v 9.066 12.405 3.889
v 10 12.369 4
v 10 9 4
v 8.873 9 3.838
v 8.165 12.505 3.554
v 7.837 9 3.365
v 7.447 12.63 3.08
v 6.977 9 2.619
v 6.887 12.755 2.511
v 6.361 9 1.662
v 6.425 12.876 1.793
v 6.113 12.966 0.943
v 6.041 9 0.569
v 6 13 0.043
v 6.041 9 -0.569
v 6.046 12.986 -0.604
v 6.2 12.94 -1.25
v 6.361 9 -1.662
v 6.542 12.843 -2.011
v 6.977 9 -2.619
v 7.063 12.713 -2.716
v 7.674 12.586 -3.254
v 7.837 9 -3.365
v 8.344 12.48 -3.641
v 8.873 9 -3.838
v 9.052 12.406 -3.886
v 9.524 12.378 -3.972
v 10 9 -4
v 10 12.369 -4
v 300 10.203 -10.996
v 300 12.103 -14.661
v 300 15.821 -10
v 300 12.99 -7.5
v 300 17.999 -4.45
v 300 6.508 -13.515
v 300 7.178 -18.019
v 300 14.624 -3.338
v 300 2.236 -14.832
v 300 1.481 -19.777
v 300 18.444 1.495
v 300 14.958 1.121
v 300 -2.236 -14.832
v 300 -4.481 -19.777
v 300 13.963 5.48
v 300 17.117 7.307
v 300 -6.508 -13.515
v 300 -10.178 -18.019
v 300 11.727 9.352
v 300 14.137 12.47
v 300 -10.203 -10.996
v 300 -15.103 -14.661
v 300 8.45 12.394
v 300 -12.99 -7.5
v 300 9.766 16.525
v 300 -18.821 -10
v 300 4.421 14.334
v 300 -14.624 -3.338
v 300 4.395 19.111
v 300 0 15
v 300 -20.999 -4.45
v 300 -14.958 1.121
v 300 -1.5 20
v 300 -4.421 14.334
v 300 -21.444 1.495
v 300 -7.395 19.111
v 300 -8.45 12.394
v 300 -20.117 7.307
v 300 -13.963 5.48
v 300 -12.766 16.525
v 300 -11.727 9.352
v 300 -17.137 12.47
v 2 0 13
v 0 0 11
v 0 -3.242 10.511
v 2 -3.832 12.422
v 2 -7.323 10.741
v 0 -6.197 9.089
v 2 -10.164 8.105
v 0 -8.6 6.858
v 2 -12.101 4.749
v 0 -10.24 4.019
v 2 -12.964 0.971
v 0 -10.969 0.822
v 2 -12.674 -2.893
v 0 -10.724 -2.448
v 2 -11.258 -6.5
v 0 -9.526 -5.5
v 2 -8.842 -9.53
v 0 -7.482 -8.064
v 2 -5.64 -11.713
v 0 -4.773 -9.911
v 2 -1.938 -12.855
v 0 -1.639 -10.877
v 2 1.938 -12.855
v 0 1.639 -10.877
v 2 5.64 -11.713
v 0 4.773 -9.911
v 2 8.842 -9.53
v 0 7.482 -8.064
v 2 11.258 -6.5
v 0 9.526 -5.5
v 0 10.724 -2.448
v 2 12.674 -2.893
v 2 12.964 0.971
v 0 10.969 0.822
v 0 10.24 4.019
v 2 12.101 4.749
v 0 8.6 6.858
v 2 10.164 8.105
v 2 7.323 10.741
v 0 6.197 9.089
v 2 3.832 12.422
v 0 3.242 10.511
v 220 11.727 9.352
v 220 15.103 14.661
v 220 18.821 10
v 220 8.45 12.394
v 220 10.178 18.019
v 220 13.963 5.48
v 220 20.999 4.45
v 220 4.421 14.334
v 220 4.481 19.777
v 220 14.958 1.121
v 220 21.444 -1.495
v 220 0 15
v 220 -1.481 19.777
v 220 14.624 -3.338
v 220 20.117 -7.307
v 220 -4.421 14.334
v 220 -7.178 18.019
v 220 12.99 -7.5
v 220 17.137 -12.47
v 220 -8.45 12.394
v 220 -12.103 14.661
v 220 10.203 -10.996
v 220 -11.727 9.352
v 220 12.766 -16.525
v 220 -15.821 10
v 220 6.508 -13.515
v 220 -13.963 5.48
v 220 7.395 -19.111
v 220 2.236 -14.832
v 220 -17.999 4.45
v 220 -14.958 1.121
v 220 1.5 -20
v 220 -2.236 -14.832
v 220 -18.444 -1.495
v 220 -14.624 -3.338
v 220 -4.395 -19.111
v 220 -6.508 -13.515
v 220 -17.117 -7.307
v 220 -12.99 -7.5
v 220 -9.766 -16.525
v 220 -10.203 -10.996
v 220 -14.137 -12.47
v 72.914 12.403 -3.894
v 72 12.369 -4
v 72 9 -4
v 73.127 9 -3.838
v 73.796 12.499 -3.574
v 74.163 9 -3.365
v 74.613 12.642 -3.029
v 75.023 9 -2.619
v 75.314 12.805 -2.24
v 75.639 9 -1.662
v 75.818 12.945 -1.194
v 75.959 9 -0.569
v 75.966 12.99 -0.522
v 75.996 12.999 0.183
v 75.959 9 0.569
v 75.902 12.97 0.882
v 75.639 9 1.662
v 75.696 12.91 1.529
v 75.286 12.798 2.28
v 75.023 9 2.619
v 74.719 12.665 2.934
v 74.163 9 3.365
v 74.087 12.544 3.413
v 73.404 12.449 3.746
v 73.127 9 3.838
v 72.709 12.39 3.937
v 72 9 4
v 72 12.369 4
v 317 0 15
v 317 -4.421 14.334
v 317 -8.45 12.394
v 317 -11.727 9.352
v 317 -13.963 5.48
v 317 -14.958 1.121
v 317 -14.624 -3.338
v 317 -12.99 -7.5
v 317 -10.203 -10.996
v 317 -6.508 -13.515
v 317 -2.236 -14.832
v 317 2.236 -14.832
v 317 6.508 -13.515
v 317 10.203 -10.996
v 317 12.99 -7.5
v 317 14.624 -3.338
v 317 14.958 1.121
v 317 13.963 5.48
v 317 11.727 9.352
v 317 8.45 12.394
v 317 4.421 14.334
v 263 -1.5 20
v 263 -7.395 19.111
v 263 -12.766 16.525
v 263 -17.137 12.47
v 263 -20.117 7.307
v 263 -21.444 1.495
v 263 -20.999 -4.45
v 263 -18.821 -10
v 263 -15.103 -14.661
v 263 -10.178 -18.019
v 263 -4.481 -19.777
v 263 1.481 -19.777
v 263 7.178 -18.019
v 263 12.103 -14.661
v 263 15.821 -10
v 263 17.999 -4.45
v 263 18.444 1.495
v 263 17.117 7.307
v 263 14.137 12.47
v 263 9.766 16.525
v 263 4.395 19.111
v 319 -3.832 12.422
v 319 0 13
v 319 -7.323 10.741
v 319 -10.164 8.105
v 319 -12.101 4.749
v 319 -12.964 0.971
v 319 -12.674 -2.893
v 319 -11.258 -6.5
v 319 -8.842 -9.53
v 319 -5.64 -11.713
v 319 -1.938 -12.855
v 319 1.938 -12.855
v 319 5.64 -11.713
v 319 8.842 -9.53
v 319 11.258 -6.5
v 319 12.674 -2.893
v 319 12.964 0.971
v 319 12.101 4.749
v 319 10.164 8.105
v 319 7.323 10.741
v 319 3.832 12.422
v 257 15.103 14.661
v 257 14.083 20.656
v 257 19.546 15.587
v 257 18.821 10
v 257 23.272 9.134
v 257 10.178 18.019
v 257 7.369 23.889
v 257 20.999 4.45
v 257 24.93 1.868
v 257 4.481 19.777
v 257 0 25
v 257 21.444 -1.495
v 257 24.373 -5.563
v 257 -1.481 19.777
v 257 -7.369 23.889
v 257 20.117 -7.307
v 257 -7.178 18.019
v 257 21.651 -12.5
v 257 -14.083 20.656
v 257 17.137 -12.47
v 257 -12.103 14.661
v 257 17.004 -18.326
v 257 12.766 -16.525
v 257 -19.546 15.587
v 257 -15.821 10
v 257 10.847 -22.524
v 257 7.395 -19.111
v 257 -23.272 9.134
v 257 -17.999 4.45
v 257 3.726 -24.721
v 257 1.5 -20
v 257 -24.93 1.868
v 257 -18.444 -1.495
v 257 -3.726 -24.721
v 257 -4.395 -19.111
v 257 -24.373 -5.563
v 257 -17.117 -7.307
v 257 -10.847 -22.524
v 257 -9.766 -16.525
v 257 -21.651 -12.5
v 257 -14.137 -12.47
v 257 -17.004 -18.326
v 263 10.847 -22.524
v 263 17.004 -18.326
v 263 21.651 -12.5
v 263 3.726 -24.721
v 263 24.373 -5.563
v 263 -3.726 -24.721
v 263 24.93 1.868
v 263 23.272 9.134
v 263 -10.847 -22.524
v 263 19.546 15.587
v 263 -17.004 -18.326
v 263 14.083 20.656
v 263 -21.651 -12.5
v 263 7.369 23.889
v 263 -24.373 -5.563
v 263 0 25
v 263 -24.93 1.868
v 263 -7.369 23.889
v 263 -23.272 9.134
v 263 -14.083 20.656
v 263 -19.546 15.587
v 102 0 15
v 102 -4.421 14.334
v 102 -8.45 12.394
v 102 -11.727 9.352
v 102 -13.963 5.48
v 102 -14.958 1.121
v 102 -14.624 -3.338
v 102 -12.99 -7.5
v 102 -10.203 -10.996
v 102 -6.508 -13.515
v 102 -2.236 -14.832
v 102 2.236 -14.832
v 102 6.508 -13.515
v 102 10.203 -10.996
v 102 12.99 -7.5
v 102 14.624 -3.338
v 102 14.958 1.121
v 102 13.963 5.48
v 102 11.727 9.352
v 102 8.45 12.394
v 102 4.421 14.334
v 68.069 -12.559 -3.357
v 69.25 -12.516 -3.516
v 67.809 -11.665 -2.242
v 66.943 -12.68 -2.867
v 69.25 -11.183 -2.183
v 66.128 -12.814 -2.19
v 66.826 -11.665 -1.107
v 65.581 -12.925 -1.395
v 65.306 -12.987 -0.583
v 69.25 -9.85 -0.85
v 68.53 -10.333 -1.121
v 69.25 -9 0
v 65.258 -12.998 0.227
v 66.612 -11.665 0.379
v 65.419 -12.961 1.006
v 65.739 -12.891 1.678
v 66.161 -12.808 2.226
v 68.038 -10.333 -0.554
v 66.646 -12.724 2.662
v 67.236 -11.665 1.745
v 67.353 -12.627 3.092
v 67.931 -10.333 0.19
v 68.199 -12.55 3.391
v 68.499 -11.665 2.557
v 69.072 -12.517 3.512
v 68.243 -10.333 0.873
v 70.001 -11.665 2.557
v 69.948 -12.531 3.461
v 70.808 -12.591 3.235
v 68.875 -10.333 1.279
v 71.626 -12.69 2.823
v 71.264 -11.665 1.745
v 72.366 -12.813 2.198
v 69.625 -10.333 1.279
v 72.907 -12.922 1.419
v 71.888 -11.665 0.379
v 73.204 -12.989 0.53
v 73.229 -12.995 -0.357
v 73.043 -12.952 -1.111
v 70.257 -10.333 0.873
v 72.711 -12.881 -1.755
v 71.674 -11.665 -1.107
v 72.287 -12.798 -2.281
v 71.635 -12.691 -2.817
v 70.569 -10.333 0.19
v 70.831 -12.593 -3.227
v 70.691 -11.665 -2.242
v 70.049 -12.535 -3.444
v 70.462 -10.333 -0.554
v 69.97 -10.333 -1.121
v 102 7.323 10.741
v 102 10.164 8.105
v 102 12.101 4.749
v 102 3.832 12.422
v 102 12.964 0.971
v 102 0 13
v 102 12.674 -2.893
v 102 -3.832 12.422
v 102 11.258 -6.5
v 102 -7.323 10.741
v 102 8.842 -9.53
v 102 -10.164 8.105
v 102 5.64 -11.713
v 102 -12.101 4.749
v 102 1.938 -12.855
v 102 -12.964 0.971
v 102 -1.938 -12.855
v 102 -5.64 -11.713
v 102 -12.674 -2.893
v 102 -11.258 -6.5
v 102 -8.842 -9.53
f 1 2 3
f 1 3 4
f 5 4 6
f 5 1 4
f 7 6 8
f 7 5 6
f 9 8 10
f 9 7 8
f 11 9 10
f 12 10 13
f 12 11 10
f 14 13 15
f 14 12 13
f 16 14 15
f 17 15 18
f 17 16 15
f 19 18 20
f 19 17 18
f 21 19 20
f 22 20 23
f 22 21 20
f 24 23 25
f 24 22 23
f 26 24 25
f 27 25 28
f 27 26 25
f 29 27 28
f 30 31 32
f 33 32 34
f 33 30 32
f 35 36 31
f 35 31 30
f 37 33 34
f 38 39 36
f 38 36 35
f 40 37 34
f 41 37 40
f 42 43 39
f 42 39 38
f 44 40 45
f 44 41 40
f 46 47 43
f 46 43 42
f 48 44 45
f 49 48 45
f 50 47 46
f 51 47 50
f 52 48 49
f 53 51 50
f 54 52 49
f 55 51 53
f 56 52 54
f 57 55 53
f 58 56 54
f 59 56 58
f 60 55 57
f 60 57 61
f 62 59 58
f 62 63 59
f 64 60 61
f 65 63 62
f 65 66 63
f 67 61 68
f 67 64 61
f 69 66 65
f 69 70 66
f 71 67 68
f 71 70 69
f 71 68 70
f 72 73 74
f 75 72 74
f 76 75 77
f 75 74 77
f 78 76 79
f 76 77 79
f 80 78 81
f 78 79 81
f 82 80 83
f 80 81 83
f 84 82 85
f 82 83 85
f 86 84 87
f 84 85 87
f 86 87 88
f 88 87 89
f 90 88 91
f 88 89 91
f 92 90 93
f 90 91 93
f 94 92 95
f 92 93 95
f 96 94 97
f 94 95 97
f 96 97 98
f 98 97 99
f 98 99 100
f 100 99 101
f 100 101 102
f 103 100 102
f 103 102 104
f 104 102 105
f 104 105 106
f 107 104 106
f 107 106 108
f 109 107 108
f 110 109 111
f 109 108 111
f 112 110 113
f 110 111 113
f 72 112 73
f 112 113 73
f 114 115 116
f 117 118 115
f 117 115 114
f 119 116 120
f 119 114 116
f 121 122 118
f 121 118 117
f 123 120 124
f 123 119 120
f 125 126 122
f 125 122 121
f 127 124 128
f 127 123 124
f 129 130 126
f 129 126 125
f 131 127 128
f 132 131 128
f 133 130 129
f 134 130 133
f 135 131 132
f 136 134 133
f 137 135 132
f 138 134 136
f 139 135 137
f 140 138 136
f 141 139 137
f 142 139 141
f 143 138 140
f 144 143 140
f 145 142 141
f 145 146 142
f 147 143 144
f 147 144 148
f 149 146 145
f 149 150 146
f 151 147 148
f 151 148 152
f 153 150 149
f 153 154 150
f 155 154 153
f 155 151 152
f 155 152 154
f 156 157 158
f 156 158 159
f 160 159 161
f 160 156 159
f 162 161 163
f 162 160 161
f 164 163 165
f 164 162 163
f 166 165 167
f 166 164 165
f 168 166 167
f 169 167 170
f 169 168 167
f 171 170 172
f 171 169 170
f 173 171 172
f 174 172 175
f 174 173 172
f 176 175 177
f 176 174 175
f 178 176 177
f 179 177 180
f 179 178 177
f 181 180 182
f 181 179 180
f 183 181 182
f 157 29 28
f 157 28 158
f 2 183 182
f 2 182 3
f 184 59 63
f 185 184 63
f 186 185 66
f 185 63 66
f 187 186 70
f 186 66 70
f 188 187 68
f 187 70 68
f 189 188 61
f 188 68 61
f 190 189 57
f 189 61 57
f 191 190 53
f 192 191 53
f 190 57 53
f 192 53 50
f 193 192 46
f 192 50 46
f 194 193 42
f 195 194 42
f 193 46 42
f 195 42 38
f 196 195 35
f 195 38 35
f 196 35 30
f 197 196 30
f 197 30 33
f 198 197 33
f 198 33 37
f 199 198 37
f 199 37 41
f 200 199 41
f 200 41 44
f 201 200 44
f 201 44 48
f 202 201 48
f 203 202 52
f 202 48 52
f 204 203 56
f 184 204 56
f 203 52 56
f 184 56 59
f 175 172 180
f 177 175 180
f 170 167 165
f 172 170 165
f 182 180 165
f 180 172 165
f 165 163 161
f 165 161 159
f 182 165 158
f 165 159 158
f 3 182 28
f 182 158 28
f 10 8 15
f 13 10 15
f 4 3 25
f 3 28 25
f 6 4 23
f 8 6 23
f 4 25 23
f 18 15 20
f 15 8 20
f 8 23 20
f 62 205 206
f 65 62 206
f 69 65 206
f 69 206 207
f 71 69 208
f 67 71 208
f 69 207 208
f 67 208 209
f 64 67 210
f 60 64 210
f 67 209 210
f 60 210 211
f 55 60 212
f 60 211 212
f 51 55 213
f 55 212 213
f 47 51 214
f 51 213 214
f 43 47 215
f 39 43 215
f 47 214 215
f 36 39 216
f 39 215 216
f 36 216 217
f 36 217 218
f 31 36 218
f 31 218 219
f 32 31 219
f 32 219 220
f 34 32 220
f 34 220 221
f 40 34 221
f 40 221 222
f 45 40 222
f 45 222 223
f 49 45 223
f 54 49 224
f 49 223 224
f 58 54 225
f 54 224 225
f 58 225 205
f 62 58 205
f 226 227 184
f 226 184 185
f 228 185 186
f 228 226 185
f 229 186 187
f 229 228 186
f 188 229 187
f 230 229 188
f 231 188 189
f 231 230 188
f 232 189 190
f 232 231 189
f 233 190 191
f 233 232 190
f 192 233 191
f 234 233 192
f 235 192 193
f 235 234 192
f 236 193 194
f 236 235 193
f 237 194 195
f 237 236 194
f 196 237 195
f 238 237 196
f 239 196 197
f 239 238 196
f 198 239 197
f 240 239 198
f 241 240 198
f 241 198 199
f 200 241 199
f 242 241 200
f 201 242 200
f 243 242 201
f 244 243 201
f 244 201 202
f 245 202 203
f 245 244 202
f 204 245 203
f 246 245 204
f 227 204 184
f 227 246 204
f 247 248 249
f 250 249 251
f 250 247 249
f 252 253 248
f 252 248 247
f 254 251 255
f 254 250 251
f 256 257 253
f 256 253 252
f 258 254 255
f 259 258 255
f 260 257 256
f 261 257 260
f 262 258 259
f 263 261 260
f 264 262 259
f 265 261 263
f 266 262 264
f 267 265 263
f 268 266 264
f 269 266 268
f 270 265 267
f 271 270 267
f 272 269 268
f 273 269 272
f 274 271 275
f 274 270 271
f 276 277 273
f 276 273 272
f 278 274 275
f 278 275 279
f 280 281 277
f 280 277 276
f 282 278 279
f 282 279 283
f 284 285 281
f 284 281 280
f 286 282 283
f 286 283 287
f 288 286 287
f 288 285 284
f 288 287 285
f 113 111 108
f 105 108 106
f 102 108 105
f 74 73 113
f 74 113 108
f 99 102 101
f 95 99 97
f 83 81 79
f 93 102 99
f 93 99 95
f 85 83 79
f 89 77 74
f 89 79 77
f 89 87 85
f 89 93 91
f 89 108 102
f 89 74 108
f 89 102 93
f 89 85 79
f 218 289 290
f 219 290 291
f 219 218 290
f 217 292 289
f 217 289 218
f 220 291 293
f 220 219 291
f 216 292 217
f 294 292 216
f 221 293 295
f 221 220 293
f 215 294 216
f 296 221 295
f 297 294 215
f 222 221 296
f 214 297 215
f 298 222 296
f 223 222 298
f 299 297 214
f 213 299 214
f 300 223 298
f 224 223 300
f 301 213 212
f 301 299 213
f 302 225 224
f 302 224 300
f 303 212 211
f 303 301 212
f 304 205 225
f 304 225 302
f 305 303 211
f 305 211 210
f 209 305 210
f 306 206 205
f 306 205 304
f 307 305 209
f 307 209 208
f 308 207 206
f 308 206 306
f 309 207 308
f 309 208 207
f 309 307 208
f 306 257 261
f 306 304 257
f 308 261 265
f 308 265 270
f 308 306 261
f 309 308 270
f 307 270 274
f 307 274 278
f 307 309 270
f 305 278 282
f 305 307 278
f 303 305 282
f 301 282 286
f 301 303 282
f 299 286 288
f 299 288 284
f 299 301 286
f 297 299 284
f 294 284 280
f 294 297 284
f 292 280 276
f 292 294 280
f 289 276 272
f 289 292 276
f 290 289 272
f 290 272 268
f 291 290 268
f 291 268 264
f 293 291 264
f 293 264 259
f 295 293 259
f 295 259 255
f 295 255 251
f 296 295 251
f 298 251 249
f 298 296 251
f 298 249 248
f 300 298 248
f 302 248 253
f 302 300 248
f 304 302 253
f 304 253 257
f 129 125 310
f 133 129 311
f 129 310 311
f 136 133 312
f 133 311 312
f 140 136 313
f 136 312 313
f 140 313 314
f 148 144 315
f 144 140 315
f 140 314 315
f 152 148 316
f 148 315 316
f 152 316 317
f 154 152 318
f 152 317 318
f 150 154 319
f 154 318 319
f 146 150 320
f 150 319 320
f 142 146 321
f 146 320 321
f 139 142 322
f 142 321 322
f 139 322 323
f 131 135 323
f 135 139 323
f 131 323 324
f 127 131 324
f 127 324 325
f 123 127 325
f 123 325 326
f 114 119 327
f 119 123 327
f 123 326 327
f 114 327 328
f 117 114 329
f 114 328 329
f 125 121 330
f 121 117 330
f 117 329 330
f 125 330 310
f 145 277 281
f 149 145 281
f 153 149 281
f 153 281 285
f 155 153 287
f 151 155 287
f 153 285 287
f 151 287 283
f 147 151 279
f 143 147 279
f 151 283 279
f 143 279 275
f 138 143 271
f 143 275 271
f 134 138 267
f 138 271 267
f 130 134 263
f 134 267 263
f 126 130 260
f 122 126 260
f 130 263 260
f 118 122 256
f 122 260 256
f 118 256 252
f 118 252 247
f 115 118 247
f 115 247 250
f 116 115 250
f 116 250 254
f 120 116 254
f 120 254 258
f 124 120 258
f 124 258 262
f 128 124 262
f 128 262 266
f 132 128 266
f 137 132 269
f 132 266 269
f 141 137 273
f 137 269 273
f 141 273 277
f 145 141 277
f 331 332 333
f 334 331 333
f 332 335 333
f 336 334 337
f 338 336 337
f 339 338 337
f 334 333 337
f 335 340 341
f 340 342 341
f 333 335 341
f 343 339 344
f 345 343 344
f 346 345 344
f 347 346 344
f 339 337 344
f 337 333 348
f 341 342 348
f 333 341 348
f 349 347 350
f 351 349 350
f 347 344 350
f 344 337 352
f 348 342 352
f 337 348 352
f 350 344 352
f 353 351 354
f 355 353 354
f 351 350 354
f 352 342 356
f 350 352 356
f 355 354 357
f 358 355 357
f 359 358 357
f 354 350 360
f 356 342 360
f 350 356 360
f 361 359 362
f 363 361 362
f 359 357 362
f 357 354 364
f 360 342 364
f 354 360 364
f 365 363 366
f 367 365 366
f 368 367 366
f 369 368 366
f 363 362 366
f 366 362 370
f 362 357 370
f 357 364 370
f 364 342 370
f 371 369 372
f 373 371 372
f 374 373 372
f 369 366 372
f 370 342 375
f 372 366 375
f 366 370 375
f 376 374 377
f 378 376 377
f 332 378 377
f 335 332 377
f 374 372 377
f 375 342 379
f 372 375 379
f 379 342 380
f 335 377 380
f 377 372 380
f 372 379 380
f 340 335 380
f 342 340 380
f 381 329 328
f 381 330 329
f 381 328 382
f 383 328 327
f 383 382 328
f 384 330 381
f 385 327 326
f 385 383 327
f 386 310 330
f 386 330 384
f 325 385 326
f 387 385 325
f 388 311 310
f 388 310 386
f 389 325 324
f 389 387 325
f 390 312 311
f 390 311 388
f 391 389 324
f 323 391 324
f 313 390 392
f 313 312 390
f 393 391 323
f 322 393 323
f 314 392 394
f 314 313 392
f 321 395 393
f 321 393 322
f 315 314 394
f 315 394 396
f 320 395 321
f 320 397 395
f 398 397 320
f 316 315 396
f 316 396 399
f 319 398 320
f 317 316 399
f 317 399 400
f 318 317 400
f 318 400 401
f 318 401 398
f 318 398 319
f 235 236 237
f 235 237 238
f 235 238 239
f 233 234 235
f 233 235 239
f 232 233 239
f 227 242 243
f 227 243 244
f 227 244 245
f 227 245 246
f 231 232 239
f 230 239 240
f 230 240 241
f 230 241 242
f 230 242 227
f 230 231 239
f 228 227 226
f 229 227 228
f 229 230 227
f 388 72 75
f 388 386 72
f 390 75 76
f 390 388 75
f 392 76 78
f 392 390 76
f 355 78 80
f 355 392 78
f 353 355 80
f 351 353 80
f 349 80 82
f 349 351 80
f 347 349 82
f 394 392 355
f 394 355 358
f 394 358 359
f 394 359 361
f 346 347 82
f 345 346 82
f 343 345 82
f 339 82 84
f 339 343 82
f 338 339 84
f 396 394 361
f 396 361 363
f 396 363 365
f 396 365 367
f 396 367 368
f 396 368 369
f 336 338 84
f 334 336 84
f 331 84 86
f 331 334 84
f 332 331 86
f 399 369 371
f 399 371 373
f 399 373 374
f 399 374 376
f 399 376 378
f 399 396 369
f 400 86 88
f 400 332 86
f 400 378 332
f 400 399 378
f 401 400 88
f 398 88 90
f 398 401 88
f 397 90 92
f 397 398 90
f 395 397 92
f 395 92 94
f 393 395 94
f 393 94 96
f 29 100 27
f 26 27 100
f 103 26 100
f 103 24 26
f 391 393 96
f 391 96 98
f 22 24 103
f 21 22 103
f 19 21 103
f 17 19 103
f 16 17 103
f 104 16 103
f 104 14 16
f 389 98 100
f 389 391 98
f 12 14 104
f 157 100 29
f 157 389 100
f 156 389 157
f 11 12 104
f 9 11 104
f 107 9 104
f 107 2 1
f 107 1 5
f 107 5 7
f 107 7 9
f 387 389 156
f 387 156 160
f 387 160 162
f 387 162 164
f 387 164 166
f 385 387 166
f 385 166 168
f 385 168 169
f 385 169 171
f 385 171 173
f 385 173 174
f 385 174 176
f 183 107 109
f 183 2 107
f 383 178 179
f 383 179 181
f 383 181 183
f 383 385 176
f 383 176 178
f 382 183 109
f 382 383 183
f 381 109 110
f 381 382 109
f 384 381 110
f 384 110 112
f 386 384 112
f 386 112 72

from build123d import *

# Parameters (mm, degrees)
CUT_EXTRUDE_START   = 13
CUT_EXTRUDE_1_DEPTH = 4
SKETCH_3_R          = 20
EXTRUDE_1_DEPTH     = 37
SKETCH_4_R          = 20
EXTRUDE_2_DEPTH     = 37
CHAMFER_1_SIZE      = 2


with BuildPart() as part:
    # 草图1 → 旋转1 (revolve)
    with BuildSketch(Plane.XY, mode=Mode.PRIVATE) as revolve_1_sk:
        Polygon((0, 0), (0, 13), (102, 13), (102, 15), (220, 15), (257, 15), (257, 25), (263, 25), (263, 15), (300, 15), (319, 15), (319, 0), align=None)
    revolve(revolve_1_sk.sketch.rotate(Axis((0, 0, 0), (1, 0, 0)), 90), axis=Axis((0, 0, 0), (1, 0, 0)))

    # 草图2 → 切除-拉伸1 (cut)
    with BuildSketch(Plane(origin=(0, 0, 0), x_dir=(1, 0, 0), z_dir=(0, 1, 0)).offset(CUT_EXTRUDE_START)):
        with BuildLine():
            Line((10, 4), (72, 4))
            ThreePointArc((72, 4), (76, 0), (72, -4))
            Line((72, -4), (10, -4))
            ThreePointArc((10, -4), (6, 0), (10, 4))
        make_face()
    extrude(amount=-CUT_EXTRUDE_1_DEPTH, mode=Mode.SUBTRACT)

    # 草图3 → 凸台-拉伸1 (add)
    with BuildSketch(Plane.ZY.offset(-257)):
        with Locations(Location((0, 1.5, 0), (0, 0, 180))):
            Circle(SKETCH_3_R)
    extrude(amount=EXTRUDE_1_DEPTH)

    # 草图4 → 凸台-拉伸2 (add)
    with BuildSketch(Plane(origin=(263, 0, 0), x_dir=(0, 0, -1), z_dir=(1, 0, 0))):
        with Locations(Location((0, -1.5, 0), (0, 0, 180))):
            Circle(SKETCH_4_R)
    extrude(amount=EXTRUDE_2_DEPTH)

    # 倒角1
    chamfer_1_edges = [part.edges().sort_by_distance(p)[0] for p in [
        (0, 0, -13),
        (319, 0, -15),
    ]]
    chamfer(chamfer_1_edges, length=CHAMFER_1_SIZE)

    # 草图5 → 切除-旋转1 (revolve, cut)
    with BuildSketch(Plane.XY, mode=Mode.PRIVATE) as cut_revolve_1_sk:
        Polygon((65.25, -13), (69.25, -9), (69.25, -13), align=None)
    revolve(cut_revolve_1_sk.sketch.rotate(Axis((69.25, -17.970703126, 0), (0, 1, 0)), 270), axis=Axis((69.25, -17.970703126, 0), (0, 1, 0)), mode=Mode.SUBTRACT)


solid = part.part
